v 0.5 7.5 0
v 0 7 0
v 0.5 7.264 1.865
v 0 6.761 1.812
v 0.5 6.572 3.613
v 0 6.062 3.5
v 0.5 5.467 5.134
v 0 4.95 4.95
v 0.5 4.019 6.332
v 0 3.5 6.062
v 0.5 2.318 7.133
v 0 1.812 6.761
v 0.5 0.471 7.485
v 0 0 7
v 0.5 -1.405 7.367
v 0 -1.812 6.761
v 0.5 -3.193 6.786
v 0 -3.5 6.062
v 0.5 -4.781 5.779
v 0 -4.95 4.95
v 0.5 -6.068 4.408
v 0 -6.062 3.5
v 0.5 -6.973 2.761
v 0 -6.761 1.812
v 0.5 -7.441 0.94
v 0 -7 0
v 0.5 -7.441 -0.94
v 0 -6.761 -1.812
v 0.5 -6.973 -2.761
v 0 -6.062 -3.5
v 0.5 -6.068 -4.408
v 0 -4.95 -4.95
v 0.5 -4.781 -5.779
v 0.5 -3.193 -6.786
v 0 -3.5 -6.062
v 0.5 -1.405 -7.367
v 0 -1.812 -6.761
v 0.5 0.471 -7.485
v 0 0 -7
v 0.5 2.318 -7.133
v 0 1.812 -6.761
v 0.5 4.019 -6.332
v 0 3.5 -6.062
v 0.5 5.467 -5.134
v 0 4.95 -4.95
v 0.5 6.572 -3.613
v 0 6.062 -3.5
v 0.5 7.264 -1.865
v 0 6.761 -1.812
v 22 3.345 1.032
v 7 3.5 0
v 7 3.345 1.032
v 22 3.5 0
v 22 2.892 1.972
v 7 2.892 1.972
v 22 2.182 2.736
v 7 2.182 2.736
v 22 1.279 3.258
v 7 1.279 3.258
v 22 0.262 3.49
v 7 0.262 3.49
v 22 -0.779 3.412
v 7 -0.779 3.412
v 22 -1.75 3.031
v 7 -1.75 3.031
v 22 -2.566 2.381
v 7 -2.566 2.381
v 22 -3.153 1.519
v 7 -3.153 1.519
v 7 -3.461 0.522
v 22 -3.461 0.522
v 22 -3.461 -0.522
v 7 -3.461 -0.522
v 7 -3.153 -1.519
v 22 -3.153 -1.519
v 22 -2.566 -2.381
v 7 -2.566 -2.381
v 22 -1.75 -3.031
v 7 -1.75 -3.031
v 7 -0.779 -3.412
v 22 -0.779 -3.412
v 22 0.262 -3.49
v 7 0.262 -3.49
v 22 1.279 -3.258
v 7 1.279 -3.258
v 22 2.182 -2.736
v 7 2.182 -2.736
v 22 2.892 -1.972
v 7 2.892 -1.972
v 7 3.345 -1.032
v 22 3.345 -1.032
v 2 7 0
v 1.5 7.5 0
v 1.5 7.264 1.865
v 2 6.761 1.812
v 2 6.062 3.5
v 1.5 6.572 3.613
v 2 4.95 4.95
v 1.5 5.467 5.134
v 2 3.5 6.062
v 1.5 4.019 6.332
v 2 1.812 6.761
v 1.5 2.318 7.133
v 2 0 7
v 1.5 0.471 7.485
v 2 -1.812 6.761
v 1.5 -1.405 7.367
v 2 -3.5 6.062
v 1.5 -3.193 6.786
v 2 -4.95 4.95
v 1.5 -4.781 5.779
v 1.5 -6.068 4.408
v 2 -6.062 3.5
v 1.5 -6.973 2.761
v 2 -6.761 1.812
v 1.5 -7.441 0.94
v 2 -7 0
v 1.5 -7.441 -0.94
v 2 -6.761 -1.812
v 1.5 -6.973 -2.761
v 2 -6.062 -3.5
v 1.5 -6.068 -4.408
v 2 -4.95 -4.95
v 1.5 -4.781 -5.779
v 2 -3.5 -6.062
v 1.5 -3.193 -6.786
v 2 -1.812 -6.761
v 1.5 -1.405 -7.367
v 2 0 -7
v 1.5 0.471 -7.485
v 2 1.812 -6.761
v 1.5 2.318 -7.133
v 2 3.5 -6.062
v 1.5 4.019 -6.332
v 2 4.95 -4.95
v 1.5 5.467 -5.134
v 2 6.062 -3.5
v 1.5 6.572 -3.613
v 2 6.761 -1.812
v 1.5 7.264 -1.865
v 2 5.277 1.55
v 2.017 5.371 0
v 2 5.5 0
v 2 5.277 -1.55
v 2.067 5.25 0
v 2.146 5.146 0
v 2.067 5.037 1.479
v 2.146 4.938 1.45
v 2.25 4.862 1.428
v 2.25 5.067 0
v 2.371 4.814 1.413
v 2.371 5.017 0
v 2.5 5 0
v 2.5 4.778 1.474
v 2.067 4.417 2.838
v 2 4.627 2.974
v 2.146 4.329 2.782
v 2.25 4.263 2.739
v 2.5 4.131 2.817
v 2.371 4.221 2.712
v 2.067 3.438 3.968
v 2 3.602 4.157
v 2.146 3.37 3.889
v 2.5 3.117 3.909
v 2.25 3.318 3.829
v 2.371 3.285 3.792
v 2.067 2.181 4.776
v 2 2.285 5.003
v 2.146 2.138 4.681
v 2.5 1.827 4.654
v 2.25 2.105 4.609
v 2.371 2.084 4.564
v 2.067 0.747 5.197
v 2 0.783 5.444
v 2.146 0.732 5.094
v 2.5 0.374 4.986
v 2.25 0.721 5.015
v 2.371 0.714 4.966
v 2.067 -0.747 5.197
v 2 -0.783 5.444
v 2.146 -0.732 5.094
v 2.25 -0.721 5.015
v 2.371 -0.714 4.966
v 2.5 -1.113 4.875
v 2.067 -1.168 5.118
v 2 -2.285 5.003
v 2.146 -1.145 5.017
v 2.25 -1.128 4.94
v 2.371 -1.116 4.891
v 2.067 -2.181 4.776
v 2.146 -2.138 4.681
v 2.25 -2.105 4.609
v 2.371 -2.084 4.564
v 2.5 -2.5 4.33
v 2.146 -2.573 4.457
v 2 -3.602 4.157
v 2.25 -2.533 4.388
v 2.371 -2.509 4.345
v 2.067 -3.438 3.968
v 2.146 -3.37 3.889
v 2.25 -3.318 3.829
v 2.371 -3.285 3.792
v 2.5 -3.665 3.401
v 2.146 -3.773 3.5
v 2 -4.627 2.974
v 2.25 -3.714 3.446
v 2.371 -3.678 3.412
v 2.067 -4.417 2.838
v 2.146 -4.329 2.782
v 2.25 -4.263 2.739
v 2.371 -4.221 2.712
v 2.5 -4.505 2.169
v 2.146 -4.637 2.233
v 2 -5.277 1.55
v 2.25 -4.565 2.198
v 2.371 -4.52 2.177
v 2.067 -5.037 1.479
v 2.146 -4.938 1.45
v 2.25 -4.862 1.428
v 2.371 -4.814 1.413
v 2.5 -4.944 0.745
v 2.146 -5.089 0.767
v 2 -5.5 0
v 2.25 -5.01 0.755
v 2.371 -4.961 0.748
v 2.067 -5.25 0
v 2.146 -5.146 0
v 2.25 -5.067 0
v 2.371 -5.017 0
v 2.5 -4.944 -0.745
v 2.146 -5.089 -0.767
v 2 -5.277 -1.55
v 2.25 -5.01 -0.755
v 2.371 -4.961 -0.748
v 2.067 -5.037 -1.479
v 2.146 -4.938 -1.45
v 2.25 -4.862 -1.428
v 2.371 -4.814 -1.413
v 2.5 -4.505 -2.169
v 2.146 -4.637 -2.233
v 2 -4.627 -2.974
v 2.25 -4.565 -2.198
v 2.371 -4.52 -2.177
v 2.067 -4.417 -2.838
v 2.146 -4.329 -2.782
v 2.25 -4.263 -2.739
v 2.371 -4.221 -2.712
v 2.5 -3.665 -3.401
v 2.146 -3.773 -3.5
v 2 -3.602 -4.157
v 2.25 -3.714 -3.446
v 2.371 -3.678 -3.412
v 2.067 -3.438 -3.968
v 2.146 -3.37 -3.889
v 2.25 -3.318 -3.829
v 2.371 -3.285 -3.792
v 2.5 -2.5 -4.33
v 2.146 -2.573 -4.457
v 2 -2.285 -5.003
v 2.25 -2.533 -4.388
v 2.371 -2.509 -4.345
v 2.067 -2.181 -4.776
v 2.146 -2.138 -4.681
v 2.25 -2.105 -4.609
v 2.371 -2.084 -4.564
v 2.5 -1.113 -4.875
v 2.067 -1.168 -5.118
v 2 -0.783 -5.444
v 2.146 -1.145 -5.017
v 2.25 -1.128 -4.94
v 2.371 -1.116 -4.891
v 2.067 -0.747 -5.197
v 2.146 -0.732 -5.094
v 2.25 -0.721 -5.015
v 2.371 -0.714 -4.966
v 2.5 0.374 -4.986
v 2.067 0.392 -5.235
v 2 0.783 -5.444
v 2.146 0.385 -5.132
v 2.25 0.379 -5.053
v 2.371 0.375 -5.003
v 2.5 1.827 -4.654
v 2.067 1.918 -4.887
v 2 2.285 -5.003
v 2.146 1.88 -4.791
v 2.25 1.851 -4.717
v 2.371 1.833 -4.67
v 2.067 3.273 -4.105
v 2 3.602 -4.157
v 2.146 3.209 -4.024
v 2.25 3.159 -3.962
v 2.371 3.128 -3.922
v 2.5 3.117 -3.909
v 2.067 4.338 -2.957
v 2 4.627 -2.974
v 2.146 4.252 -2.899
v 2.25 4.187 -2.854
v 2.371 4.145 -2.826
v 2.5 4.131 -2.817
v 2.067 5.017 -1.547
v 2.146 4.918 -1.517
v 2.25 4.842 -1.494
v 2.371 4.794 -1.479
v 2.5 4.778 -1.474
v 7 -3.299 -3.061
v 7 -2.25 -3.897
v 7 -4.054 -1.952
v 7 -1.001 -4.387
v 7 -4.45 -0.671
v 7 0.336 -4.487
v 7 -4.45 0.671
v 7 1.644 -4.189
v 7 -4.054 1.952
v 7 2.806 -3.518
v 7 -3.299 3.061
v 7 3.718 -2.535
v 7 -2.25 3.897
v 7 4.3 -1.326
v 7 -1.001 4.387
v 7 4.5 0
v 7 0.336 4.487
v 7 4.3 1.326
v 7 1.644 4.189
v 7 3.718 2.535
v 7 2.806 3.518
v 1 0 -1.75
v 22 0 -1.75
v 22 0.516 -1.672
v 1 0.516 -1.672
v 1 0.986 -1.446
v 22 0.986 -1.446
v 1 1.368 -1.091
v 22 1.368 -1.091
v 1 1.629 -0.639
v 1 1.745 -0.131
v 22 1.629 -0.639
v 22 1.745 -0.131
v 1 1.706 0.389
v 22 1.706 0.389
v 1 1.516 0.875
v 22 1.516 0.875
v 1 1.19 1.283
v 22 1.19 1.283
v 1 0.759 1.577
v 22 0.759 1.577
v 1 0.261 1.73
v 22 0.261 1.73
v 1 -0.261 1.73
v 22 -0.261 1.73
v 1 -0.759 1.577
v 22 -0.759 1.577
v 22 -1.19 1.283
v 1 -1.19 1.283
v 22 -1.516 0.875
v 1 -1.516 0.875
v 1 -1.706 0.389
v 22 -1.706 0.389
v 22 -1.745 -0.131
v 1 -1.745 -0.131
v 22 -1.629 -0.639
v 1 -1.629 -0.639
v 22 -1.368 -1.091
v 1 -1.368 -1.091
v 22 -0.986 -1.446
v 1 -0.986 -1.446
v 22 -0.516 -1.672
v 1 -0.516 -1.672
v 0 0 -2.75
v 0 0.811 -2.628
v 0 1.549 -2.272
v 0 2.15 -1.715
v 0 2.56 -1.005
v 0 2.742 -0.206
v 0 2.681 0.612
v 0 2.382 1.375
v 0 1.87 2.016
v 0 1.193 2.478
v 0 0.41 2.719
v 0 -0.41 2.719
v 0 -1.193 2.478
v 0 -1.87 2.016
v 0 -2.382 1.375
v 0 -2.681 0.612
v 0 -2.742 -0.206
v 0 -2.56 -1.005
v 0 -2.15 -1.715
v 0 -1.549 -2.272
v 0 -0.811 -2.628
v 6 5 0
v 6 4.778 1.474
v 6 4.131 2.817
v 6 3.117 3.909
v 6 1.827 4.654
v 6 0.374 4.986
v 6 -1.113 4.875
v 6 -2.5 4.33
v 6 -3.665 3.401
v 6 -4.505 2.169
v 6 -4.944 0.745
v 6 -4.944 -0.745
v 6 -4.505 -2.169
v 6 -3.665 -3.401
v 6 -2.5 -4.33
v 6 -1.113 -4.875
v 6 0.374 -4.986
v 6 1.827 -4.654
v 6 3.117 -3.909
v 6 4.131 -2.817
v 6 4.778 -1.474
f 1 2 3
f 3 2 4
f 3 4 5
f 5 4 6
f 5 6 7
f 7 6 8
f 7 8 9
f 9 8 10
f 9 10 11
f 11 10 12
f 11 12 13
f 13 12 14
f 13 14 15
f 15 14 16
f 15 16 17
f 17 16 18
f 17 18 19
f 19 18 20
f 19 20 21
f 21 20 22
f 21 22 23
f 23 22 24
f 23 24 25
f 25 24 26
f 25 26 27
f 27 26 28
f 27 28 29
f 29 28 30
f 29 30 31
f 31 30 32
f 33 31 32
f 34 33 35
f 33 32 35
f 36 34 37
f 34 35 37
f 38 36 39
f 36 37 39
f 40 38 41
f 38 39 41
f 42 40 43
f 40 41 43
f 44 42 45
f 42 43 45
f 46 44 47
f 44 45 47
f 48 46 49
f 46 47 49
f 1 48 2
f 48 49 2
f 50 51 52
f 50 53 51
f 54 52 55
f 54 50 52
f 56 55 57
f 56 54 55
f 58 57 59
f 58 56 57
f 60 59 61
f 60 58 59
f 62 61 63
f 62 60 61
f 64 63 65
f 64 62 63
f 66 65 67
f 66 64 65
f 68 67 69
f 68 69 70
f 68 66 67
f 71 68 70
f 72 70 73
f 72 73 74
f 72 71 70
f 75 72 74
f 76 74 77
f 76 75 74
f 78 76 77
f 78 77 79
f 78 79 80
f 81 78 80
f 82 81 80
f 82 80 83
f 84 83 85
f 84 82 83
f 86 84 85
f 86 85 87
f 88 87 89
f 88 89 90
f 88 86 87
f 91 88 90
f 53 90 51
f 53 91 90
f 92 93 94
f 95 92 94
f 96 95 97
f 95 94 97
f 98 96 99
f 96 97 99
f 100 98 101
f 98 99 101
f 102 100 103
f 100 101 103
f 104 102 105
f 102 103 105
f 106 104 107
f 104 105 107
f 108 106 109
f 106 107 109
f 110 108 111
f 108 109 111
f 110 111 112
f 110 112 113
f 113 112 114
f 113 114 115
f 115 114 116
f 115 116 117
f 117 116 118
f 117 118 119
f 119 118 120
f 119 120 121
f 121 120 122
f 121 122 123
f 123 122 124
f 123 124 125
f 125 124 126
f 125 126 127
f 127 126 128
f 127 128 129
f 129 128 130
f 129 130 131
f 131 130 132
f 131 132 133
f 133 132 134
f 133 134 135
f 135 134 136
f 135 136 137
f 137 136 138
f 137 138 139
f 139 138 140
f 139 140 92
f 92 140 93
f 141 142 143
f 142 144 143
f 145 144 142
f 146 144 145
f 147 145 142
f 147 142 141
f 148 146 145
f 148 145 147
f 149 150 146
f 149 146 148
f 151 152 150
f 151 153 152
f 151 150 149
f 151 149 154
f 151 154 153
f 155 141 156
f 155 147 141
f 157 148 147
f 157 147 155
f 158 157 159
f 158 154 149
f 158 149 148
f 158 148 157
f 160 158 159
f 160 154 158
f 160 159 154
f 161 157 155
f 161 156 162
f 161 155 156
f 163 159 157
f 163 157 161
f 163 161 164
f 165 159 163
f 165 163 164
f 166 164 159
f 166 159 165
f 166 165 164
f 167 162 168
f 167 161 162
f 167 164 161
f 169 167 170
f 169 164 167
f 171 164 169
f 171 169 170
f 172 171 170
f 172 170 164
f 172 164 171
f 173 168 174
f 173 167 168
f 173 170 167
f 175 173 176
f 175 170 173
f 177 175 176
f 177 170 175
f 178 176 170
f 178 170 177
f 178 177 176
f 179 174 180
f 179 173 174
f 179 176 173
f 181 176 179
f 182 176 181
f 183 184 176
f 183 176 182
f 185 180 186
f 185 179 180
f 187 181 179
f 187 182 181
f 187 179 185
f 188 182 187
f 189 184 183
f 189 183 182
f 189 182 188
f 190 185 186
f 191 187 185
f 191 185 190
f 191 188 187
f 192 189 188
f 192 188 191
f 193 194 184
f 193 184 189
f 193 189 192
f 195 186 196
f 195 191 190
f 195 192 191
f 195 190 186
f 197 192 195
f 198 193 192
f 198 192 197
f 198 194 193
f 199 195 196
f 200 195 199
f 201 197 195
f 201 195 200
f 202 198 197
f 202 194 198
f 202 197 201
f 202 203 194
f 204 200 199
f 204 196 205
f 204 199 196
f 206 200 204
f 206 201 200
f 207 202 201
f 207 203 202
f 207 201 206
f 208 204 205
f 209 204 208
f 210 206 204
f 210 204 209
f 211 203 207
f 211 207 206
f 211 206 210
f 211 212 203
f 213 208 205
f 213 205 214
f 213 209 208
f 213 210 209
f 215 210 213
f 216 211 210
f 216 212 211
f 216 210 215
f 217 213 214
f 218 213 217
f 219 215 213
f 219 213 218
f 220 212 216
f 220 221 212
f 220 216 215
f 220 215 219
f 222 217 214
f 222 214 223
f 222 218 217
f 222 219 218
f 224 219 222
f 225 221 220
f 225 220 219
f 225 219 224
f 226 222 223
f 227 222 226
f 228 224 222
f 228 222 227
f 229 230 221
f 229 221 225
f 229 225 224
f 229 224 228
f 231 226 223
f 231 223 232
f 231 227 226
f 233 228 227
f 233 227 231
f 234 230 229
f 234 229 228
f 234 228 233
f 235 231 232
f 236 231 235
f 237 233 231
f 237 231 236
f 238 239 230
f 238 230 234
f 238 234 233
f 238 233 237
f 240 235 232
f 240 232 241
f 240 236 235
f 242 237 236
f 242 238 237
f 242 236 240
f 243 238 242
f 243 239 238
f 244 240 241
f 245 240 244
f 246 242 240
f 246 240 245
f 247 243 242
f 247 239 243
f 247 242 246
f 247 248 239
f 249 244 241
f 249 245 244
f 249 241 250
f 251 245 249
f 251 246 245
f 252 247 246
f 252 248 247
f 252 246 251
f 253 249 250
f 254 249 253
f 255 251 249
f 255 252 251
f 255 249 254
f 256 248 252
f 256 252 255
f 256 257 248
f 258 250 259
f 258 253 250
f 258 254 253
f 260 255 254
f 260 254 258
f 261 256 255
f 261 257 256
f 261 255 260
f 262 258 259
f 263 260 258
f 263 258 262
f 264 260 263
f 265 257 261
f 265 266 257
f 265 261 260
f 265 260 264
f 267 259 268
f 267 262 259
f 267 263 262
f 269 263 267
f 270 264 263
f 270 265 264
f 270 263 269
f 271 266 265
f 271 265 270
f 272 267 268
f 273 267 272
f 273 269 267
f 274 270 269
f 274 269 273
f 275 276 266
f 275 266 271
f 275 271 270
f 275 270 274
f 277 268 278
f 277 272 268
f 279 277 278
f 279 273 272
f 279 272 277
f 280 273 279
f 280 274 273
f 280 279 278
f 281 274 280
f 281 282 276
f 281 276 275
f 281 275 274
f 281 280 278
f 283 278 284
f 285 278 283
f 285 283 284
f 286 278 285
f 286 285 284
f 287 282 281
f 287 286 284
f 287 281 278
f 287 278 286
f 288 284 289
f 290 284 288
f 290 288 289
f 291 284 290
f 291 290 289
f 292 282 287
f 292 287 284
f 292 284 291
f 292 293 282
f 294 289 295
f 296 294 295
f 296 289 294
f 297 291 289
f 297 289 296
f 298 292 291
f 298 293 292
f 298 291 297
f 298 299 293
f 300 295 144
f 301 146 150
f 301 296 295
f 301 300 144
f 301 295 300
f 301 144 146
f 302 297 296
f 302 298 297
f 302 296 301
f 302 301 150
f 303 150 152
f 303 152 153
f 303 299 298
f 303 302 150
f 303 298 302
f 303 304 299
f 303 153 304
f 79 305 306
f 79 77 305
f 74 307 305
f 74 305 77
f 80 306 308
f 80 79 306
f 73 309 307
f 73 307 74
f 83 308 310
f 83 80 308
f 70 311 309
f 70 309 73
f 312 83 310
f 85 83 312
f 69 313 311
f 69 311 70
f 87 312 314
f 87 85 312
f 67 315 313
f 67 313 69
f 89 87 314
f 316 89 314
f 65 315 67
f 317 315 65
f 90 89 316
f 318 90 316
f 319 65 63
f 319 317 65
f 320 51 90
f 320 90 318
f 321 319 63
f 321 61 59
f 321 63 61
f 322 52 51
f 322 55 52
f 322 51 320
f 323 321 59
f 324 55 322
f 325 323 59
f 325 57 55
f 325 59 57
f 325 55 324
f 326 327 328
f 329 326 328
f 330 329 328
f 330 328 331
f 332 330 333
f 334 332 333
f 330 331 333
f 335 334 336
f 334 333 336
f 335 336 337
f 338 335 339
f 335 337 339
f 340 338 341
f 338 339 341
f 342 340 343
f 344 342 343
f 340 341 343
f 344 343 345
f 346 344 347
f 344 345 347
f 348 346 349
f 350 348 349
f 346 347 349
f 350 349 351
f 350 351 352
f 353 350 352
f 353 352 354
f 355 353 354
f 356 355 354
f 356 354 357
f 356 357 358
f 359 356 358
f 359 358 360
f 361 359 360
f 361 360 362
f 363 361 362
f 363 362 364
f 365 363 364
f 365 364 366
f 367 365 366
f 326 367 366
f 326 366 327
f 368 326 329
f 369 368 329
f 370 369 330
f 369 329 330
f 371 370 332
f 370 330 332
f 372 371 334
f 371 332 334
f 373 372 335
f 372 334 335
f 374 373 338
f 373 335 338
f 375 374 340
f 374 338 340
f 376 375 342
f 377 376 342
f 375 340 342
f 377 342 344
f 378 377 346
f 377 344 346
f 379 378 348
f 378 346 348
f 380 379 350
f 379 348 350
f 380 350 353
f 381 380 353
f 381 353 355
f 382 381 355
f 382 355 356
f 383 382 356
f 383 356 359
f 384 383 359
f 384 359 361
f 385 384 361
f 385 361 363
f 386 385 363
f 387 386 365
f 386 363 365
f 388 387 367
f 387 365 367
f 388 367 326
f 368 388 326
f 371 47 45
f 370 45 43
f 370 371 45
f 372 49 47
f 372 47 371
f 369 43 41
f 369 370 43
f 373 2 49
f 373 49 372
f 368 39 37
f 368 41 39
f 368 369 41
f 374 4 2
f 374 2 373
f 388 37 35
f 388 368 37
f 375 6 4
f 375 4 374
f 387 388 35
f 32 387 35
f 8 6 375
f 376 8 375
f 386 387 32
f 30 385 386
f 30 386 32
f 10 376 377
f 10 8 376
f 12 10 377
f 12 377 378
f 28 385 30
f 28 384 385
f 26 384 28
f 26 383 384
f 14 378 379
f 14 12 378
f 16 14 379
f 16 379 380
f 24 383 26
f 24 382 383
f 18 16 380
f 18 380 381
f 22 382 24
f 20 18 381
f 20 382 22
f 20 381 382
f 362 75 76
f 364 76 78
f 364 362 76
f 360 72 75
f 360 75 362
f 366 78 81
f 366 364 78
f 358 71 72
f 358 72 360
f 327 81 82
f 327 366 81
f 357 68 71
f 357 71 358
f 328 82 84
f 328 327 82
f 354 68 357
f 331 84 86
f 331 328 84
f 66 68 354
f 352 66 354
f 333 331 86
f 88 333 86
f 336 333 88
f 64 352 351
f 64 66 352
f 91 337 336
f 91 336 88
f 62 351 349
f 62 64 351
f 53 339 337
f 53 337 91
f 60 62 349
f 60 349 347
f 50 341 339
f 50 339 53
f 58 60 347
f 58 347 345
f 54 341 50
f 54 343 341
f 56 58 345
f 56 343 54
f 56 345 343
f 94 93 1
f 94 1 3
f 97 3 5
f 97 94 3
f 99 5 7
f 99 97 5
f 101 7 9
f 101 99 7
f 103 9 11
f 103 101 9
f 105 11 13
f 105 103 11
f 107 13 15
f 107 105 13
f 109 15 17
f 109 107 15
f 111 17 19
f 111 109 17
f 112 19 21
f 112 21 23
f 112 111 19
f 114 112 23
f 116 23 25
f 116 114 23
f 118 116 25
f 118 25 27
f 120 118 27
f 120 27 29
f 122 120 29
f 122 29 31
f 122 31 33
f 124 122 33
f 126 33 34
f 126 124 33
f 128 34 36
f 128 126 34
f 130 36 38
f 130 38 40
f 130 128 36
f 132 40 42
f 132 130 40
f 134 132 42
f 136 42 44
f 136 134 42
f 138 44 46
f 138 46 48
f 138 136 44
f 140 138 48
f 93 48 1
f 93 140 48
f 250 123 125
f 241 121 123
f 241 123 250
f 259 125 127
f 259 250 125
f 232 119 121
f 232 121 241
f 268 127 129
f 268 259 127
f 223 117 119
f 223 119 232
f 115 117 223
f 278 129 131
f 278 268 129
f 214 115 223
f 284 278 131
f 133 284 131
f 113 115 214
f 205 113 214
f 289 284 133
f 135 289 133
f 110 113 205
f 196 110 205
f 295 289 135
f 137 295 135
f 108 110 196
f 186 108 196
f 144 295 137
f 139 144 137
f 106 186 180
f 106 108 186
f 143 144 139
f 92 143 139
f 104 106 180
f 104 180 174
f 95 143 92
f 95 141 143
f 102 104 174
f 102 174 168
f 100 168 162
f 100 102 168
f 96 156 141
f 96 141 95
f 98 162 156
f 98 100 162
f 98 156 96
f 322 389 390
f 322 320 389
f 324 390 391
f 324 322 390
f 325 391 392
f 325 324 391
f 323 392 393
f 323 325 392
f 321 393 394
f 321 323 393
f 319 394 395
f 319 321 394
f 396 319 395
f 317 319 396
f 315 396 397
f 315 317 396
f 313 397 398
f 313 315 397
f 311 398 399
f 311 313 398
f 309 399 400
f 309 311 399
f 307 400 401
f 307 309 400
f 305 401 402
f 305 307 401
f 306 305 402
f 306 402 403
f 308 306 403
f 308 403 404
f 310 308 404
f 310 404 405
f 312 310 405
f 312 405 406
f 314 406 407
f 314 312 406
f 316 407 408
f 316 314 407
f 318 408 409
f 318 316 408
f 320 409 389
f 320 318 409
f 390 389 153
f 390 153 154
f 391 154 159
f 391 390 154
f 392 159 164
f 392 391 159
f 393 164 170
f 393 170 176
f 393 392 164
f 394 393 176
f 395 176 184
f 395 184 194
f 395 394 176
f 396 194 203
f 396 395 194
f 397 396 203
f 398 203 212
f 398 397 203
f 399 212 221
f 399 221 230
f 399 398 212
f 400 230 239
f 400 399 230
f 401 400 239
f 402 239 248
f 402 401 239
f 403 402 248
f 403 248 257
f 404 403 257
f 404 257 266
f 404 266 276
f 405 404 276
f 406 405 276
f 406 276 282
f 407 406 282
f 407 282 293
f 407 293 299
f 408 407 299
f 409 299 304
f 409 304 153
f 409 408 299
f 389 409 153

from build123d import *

# Parameters (mm, degrees)
FILLET1_R          = 0.5
CHAMFER1_SIZE      = 0.5
SKETCH2_R          = 1.75
CUT_EXTRUDE1_DEPTH = 23
CHAMFER2_SIZE      = 1


with BuildPart() as part:
    # Sketch1 → Revolve1 (revolve)
    with BuildSketch(Plane.XY):
        Polygon((0, 0), (0, 7.5), (2, 7.5), (2, 5), (6, 5), (7, 4.5), (7, 3.5), (22, 3.5), (22, 0), align=None)
    revolve(axis=Axis((0, 0, 0), (1, 0, 0)))

    # Fillet1
    fillet1_edges = [part.edges().sort_by_distance(p)[0] for p in [
        (2, -5, 0),
    ]]
    fillet(fillet1_edges, radius=FILLET1_R)

    # Chamfer1
    chamfer1_edges = [part.edges().sort_by_distance(p)[0] for p in [
        (2, -7.5, 0),
        (0, -7.5, 0),
    ]]
    chamfer(chamfer1_edges, length=CHAMFER1_SIZE)

    # Sketch2 → Cut-Extrude1 (cut, through all)
    with BuildSketch(Plane(origin=(22, 0, 0), x_dir=(0, 0, -1), z_dir=(1, 0, 0))):
        Circle(SKETCH2_R)
    extrude(amount=-CUT_EXTRUDE1_DEPTH, mode=Mode.SUBTRACT)

    # Chamfer2
    chamfer2_edges = [part.edges().sort_by_distance(p)[0] for p in [
        (0, 0, 1.75),
    ]]
    chamfer(chamfer2_edges, length=CHAMFER2_SIZE)


solid = part.part
